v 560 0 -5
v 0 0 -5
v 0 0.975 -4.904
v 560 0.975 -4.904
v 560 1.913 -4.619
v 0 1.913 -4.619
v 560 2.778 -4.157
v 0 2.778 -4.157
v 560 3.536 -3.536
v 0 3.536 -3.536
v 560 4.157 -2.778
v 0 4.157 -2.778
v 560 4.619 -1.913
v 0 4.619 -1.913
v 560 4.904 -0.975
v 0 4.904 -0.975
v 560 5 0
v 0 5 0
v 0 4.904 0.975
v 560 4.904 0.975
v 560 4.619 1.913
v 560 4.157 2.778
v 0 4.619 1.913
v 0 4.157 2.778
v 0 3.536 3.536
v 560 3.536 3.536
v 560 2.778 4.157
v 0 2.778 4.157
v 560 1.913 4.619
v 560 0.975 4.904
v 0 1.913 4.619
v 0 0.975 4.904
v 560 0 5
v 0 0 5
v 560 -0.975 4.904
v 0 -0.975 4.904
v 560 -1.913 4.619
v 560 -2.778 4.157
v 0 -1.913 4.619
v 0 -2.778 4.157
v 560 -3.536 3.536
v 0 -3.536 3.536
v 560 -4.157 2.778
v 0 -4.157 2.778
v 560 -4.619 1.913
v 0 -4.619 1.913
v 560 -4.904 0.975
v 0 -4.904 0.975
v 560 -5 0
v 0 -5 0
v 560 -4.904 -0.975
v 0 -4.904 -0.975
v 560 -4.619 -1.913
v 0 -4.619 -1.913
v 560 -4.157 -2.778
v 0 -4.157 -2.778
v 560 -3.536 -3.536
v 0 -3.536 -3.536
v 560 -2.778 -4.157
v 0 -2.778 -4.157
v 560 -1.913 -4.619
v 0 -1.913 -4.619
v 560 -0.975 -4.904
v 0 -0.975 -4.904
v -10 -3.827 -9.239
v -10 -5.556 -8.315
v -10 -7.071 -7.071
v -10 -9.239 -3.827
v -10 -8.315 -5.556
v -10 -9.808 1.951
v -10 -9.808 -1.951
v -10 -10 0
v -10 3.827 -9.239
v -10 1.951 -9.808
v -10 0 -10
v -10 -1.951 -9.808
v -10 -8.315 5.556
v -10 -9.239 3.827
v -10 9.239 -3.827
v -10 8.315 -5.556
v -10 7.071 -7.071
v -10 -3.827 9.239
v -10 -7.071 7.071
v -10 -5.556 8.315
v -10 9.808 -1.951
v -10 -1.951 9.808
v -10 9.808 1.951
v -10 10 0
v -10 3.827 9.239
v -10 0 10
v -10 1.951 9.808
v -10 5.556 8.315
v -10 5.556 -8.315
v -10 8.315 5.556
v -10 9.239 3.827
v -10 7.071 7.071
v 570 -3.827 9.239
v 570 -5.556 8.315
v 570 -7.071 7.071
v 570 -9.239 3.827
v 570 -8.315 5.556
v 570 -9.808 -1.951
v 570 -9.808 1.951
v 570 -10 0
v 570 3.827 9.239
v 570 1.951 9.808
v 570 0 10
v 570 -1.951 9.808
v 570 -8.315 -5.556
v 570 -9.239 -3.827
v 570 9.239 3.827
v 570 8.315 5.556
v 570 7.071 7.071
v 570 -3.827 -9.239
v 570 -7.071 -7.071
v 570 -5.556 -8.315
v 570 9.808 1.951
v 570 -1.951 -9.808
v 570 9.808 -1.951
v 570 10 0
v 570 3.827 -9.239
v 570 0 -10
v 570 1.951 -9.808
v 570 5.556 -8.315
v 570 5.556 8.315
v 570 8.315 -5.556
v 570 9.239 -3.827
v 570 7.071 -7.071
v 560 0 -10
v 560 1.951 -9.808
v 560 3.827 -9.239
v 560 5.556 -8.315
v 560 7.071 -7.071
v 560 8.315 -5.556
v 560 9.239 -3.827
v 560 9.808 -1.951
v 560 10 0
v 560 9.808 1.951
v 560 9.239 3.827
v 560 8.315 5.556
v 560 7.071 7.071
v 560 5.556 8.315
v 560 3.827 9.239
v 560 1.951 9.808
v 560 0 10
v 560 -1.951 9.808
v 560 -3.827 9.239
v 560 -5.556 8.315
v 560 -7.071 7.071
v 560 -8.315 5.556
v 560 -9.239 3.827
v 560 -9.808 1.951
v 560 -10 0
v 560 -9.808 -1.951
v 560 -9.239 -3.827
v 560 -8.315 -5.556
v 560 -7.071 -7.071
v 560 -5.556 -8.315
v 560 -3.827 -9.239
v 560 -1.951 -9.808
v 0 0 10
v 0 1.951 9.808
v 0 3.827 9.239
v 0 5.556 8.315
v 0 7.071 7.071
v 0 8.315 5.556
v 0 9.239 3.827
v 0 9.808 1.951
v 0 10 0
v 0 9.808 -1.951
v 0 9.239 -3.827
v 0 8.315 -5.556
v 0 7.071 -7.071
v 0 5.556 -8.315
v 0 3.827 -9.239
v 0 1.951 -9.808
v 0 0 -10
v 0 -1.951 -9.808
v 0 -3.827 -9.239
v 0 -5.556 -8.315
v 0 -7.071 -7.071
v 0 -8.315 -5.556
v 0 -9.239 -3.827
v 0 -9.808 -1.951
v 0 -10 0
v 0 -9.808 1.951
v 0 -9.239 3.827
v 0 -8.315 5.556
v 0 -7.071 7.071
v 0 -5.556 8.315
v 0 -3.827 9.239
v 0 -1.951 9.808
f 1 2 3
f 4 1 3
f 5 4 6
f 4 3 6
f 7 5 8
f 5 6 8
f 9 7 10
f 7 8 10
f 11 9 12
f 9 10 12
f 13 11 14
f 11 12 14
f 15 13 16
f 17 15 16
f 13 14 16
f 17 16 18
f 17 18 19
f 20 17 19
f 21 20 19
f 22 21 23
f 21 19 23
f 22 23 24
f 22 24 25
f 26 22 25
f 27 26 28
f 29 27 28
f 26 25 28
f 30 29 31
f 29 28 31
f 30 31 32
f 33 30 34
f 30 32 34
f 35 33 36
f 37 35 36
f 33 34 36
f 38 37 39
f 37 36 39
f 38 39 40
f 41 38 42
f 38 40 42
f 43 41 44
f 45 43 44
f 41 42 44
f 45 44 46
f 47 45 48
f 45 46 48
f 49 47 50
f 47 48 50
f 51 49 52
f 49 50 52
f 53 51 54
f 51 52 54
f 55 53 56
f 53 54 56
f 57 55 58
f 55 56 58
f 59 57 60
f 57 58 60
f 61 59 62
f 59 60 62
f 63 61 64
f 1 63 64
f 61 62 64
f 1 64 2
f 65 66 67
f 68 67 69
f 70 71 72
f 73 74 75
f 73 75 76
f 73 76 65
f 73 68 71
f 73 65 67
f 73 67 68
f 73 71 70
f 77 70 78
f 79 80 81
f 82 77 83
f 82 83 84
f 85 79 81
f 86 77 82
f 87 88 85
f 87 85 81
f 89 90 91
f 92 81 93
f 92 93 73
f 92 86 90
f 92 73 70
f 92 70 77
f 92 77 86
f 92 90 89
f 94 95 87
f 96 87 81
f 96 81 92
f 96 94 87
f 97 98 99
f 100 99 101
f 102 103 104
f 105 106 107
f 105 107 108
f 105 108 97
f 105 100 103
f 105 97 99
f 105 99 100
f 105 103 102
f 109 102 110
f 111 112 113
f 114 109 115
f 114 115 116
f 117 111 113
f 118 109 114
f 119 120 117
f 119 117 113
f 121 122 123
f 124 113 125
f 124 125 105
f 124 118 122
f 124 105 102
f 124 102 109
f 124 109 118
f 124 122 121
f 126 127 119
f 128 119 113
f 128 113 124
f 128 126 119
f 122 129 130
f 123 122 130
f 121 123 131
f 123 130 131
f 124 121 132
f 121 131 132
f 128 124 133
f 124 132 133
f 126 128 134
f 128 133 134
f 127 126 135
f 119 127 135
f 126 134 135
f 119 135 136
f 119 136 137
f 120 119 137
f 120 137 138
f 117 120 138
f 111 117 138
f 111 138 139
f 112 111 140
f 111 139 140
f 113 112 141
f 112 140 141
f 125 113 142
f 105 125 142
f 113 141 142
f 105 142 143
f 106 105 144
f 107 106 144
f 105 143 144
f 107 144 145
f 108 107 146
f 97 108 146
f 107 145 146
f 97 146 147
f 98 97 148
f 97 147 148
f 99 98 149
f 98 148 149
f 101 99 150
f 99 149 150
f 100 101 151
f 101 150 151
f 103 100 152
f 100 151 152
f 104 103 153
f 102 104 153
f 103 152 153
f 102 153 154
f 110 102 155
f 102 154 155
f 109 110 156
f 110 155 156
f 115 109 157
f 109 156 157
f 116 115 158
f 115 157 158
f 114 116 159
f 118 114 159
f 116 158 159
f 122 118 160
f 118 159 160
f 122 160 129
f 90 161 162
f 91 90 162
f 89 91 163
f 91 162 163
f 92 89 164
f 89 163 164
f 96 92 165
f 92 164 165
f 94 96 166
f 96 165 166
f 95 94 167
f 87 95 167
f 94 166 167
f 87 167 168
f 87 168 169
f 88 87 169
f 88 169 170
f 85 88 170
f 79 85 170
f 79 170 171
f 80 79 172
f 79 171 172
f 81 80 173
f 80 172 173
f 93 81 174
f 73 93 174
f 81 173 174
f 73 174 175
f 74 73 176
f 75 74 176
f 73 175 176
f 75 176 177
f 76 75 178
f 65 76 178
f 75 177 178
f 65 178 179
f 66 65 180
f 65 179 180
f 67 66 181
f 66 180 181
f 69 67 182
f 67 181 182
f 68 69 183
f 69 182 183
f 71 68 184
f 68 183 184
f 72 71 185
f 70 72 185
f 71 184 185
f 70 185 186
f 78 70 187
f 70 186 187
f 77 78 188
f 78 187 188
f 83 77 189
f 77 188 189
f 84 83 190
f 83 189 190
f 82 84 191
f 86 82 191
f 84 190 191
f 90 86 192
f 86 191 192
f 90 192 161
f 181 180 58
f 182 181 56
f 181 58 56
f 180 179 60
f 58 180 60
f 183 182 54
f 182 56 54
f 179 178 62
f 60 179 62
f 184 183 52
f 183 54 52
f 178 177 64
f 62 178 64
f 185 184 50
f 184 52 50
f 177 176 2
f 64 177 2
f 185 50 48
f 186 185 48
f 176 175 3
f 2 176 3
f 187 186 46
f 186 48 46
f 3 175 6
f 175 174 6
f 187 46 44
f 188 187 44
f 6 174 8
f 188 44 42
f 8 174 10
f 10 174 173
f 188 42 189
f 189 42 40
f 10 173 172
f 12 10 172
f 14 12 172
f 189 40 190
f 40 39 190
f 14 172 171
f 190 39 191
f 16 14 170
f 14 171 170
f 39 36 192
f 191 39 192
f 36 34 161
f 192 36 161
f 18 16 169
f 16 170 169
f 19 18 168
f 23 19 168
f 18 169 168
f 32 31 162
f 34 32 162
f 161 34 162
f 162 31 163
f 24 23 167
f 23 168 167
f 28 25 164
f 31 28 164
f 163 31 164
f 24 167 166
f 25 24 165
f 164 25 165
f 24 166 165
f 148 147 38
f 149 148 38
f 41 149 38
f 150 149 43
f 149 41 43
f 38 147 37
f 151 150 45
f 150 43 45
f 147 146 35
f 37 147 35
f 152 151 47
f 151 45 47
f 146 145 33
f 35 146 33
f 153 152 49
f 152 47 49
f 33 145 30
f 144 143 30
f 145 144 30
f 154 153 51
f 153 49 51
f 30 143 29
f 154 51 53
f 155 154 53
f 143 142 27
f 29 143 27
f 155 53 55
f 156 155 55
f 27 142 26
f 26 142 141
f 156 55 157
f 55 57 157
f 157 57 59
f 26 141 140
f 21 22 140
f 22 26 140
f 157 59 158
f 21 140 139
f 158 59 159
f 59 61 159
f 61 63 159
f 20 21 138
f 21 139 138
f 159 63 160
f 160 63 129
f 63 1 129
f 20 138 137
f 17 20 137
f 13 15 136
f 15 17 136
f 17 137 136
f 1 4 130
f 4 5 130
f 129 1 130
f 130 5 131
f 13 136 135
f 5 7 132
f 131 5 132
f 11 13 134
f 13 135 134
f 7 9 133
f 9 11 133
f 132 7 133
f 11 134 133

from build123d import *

# Parameters (mm, degrees)
SKETCH1_R           = 5
BOSS_EXTRUDE1_DEPTH = 560
SKETCH2_R           = 10
BOSS_EXTRUDE2_DEPTH = 10
SKETCH3_R           = 10
BOSS_EXTRUDE3_DEPTH = 10


with BuildPart() as part:
    # Sketch1 → Boss-Extrude1 (new body)
    with BuildSketch(Plane(origin=(0, 0, 0), x_dir=(0, 0, -1), z_dir=(1, 0, 0))):
        Circle(SKETCH1_R)
    extrude(amount=BOSS_EXTRUDE1_DEPTH)

    # Sketch2 → Boss-Extrude2 (add)
    with BuildSketch(Plane(origin=(560, 0, 0), x_dir=(0, 0, -1), z_dir=(1, 0, 0))):
        Circle(SKETCH2_R)
    extrude(amount=BOSS_EXTRUDE2_DEPTH)

    # Sketch3 → Boss-Extrude3 (add)
    with BuildSketch(Plane.ZY):
        Circle(SKETCH3_R)
    extrude(amount=BOSS_EXTRUDE3_DEPTH)


solid = part.part
